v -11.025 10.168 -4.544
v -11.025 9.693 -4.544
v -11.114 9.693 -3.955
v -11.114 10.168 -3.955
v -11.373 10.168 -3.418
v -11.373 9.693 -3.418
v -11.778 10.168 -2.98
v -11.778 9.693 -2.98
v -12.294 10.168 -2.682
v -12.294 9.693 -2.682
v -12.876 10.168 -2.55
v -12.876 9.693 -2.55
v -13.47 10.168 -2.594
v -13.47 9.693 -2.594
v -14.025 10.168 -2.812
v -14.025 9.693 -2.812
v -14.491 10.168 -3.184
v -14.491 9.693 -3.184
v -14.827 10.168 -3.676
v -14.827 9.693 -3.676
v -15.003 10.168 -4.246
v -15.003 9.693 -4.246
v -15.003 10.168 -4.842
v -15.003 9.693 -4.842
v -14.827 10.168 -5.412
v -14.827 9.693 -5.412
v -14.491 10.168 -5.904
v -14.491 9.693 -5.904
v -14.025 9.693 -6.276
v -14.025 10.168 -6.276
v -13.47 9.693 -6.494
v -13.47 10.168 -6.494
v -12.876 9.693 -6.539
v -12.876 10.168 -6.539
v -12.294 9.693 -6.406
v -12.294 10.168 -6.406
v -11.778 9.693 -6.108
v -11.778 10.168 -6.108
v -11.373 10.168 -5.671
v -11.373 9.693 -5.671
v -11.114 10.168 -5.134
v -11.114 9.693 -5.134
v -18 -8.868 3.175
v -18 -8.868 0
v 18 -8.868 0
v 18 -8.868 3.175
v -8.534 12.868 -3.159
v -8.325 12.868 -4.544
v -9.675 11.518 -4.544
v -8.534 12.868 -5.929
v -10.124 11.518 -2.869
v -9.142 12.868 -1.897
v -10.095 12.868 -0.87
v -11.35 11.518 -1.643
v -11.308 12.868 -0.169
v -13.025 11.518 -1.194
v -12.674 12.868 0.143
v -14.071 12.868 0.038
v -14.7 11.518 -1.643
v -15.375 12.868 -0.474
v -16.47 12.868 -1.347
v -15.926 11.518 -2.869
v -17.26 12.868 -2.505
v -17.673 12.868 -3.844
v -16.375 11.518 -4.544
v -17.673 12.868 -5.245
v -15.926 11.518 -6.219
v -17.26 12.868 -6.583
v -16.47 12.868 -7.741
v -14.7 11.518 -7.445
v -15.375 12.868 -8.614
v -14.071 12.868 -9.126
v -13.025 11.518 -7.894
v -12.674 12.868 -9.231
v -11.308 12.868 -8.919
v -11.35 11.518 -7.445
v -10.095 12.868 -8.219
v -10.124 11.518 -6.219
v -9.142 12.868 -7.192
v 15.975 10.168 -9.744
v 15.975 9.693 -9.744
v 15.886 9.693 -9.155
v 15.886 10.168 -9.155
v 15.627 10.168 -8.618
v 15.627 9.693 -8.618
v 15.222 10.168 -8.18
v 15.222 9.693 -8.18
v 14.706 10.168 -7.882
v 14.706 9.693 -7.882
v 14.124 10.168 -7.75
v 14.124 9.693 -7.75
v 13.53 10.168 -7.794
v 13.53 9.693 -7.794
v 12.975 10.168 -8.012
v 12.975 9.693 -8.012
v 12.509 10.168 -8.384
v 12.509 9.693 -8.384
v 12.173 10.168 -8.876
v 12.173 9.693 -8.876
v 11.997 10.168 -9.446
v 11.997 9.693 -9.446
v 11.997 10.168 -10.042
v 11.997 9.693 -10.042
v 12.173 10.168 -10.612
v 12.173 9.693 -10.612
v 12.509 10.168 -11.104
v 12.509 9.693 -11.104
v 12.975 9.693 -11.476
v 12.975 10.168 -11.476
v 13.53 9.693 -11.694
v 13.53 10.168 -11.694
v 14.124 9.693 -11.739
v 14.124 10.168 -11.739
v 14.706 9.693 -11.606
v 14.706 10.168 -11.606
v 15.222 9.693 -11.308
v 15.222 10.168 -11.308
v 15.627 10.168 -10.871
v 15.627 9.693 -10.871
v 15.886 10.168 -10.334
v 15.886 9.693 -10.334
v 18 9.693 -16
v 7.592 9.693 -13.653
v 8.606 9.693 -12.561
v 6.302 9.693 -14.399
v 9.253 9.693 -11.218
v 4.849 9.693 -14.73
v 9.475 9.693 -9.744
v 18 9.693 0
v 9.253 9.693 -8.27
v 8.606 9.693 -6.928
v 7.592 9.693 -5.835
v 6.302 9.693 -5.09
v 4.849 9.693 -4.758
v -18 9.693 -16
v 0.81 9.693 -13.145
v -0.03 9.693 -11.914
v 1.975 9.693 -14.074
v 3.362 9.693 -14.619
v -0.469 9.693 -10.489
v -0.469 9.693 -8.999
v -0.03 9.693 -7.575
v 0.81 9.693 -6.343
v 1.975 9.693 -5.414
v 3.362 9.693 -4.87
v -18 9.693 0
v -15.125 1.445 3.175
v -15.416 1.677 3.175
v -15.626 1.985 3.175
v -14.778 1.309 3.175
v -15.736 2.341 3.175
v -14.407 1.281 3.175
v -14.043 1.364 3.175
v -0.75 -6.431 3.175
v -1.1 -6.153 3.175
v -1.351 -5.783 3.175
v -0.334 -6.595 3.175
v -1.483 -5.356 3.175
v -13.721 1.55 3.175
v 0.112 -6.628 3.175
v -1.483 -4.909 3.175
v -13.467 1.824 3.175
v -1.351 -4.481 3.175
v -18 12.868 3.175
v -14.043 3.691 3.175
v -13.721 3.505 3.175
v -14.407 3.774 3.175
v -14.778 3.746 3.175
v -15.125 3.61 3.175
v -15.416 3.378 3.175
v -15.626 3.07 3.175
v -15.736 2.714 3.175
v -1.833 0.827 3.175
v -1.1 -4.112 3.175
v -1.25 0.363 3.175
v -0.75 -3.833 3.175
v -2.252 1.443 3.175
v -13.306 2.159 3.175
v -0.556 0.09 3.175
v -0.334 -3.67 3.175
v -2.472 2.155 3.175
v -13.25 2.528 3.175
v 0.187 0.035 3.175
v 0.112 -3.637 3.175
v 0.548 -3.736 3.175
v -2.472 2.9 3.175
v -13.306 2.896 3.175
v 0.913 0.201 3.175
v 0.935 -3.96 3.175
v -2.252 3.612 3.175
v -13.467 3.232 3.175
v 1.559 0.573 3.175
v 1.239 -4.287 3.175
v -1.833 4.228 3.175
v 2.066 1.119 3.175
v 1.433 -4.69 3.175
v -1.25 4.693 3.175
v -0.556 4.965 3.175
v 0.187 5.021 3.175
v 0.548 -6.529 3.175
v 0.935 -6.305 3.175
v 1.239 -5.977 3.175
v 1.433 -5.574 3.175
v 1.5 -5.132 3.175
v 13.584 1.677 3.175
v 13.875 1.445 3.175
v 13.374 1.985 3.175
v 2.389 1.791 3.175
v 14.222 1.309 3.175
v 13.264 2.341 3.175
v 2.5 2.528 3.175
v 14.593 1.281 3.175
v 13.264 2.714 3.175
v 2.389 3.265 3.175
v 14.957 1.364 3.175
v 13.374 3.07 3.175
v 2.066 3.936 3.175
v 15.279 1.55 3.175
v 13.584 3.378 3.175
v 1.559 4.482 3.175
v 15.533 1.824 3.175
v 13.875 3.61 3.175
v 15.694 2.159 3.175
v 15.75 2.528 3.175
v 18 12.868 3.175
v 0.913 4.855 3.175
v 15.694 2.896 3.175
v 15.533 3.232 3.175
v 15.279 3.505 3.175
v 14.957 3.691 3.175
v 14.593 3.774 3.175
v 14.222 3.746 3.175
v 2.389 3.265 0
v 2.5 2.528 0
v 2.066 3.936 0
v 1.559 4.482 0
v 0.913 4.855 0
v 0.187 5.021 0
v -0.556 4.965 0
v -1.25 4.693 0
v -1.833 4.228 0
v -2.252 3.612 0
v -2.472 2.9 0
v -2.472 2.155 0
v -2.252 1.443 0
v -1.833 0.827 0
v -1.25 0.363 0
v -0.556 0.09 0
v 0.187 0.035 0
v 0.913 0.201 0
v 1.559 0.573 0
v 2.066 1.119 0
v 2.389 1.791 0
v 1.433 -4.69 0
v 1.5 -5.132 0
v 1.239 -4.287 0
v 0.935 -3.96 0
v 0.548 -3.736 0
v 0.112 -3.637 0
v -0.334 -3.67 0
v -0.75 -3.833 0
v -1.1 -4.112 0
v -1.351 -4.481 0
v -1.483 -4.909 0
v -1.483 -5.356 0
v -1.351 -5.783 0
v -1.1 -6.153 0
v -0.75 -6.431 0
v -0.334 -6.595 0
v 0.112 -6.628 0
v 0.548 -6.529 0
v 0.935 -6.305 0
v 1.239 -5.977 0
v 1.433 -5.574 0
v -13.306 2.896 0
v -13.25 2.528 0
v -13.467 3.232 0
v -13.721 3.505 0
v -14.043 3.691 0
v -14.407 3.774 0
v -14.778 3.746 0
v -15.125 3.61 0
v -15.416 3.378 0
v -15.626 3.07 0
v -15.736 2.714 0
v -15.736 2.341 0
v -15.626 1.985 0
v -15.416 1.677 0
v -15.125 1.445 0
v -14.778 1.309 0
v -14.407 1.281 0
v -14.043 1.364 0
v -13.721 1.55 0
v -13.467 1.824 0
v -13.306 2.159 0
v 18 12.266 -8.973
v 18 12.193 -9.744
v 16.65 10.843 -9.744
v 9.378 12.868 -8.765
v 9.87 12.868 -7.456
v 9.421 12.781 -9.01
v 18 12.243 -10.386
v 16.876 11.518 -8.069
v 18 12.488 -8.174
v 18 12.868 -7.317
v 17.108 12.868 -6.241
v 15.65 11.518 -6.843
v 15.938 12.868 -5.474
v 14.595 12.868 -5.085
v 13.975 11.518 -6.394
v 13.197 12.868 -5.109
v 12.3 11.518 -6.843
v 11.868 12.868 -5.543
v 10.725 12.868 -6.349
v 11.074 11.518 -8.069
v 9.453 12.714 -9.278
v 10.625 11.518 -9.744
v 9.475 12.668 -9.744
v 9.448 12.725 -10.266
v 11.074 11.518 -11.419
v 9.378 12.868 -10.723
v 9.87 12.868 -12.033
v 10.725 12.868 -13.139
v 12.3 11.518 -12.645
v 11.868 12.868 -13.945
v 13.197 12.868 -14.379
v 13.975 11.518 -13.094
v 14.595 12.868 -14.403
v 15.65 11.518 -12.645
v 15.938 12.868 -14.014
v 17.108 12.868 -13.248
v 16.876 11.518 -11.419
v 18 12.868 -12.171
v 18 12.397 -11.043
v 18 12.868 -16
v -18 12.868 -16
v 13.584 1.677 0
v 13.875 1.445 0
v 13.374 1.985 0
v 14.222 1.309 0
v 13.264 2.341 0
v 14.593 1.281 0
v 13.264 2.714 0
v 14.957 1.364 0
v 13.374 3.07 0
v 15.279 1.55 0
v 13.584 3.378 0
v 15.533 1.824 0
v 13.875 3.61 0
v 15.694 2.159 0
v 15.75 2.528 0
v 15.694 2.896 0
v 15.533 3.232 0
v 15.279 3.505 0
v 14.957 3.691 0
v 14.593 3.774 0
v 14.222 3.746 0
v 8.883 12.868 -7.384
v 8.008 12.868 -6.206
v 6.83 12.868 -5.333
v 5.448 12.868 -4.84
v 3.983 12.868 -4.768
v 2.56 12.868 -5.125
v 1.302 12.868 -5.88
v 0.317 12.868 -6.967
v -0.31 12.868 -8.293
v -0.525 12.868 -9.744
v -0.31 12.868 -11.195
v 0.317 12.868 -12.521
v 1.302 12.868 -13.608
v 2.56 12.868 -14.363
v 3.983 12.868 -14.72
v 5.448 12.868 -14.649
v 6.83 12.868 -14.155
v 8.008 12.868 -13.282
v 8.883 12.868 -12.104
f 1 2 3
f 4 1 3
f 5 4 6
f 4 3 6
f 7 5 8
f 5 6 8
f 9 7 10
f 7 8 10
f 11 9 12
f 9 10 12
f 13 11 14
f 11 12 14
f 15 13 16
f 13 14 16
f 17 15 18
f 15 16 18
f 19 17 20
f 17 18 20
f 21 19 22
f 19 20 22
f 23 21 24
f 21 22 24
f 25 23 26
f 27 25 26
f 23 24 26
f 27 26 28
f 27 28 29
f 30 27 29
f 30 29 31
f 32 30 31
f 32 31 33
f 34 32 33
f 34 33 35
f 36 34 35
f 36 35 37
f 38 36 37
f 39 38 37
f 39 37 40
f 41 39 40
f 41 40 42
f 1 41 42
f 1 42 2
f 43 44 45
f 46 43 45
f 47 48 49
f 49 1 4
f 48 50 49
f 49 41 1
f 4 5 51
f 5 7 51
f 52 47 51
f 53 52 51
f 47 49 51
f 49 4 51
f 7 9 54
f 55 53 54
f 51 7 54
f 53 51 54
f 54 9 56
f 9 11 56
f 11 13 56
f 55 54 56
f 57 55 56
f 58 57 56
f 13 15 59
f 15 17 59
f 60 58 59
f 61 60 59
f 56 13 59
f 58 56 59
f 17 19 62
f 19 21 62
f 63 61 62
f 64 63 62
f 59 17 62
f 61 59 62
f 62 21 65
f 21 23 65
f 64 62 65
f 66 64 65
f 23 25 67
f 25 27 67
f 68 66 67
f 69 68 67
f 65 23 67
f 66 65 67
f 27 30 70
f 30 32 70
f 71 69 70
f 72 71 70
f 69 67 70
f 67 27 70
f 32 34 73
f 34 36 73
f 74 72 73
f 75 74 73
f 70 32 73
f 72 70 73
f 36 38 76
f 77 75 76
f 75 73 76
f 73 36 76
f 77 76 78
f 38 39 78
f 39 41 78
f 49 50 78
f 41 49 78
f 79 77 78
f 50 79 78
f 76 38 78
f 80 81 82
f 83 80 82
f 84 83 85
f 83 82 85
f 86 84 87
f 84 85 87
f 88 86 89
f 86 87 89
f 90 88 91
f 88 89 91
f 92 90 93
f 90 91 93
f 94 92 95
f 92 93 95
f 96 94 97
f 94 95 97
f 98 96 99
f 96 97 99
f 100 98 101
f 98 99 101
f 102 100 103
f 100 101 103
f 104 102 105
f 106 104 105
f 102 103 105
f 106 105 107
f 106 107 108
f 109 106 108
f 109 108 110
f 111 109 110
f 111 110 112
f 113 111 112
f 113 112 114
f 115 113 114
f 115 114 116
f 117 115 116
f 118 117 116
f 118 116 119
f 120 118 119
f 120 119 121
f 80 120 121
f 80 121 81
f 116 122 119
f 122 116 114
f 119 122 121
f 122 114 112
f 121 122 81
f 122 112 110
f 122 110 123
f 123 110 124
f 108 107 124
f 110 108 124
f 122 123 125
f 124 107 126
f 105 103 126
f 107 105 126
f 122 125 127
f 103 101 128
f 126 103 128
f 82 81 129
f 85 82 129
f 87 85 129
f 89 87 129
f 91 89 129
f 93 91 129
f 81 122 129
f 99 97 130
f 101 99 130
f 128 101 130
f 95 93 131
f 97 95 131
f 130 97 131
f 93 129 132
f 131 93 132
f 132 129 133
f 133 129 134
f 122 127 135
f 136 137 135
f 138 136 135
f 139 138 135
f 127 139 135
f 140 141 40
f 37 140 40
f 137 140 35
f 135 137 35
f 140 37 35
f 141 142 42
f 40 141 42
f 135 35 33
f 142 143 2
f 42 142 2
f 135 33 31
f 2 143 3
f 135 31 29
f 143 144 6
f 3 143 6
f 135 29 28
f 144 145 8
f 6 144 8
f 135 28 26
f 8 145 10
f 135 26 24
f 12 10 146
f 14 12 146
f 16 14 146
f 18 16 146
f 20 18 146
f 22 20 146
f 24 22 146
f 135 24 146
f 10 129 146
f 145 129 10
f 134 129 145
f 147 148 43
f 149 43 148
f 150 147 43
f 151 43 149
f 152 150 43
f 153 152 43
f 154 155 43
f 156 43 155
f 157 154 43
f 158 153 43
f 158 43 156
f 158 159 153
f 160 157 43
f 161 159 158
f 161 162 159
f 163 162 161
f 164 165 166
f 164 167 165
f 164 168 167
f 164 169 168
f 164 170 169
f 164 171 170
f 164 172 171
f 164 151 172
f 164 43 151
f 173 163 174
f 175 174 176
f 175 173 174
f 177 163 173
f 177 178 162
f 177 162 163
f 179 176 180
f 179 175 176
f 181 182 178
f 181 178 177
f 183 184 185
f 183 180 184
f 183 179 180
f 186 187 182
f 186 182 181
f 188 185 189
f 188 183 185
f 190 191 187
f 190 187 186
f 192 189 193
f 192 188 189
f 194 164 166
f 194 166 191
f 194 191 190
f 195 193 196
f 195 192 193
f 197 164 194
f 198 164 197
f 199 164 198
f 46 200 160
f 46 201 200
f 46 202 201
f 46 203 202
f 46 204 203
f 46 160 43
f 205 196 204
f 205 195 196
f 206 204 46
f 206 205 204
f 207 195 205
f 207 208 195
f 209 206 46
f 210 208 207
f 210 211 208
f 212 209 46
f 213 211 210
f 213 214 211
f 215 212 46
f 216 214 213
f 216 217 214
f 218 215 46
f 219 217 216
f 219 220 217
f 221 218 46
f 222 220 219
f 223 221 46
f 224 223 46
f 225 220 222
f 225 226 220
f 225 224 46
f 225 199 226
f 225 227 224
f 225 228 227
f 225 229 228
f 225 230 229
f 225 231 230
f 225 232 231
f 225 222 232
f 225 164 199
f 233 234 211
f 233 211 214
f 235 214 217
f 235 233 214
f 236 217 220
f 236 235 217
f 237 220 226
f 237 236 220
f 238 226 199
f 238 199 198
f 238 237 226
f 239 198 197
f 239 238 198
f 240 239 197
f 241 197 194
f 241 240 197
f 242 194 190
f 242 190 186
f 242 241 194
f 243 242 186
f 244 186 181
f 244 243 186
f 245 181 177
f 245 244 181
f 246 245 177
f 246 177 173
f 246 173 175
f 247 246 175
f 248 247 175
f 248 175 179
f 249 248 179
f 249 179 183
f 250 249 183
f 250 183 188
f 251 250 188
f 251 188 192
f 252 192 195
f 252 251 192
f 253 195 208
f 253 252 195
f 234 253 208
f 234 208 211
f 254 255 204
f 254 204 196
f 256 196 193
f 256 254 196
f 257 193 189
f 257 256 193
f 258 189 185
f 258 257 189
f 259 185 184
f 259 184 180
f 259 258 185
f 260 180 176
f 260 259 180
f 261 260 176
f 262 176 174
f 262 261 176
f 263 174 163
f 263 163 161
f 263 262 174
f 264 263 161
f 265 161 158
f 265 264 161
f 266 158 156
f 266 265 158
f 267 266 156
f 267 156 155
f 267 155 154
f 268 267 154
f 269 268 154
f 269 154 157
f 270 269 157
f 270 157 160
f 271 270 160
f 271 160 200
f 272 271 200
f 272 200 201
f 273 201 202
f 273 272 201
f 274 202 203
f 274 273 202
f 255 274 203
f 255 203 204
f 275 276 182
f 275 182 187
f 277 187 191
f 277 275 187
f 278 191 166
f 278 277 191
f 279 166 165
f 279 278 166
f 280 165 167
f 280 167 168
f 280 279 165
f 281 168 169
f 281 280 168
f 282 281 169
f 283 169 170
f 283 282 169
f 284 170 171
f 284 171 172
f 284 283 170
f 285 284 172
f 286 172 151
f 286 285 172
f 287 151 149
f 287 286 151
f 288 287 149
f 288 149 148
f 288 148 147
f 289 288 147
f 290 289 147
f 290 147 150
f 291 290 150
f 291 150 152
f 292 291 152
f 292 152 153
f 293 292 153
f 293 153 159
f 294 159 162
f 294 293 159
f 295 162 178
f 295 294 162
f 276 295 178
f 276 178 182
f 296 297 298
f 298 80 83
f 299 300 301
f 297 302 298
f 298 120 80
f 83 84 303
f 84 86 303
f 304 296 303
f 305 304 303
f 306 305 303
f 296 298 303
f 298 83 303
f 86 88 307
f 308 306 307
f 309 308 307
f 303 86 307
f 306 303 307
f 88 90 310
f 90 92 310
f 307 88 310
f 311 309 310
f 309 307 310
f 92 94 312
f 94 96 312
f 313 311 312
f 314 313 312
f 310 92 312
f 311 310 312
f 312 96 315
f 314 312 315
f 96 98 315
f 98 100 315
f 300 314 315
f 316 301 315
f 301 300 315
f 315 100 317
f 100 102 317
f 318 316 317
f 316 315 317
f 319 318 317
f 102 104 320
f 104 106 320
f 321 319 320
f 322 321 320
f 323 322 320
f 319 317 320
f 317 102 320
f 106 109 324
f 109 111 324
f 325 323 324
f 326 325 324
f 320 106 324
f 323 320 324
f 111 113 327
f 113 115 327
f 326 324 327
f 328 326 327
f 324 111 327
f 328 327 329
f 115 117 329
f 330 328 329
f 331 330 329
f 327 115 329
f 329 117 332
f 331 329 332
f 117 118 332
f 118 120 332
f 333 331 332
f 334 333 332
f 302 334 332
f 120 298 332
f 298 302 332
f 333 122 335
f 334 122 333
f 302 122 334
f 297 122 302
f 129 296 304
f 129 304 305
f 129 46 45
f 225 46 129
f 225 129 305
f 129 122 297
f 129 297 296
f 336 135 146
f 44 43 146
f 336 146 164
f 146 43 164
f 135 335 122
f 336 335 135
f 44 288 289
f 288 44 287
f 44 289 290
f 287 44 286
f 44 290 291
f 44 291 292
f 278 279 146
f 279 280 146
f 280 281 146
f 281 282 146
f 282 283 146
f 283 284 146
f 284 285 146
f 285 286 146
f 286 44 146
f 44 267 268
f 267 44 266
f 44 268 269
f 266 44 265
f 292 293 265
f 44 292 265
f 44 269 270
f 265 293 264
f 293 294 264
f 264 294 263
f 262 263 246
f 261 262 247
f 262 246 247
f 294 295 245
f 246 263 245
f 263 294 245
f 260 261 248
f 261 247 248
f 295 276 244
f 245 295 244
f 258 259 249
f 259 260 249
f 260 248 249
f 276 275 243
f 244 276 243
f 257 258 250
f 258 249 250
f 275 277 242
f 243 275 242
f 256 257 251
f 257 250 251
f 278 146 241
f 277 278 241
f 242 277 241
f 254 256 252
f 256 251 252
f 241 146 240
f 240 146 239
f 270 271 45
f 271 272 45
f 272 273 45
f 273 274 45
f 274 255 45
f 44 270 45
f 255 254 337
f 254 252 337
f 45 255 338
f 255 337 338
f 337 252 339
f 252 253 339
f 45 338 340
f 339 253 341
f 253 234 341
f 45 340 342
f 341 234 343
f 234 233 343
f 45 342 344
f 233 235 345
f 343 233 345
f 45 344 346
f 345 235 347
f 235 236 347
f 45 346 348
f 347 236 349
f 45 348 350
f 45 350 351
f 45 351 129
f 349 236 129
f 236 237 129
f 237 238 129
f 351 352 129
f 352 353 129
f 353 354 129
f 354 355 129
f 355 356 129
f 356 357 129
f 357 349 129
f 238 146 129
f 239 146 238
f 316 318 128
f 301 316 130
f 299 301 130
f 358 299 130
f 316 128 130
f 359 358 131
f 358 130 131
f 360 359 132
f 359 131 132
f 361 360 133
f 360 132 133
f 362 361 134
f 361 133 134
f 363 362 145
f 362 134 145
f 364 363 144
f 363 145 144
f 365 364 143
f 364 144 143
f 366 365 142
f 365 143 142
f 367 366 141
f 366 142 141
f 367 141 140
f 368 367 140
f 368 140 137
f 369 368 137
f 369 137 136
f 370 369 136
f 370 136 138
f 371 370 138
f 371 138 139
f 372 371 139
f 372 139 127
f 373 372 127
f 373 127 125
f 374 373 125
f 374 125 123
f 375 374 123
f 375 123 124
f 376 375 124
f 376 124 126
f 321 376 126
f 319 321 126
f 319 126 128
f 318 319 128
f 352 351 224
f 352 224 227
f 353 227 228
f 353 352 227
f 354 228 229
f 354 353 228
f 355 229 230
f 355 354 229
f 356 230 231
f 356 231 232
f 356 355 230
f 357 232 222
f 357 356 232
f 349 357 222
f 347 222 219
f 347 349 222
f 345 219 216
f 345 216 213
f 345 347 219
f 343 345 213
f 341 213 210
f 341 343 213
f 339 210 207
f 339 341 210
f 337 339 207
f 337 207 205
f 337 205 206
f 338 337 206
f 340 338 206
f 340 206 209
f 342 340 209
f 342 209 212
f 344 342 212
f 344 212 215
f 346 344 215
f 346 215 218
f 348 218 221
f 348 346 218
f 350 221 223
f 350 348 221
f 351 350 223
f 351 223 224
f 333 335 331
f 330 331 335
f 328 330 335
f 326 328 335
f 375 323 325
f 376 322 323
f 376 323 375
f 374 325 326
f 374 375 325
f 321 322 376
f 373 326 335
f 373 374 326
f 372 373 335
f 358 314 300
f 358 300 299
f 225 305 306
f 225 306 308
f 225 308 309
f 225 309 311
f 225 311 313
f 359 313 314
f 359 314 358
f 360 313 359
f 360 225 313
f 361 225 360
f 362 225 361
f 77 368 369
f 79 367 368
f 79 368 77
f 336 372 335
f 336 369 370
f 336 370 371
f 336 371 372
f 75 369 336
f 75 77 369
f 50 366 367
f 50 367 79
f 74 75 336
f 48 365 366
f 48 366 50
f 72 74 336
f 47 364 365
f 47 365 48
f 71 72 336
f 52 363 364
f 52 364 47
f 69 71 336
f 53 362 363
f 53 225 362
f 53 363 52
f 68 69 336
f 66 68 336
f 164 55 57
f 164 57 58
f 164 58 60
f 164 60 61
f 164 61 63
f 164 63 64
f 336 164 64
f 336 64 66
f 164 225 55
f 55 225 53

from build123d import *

# Parameters (mm, degrees)
SKETCH1_W                                            = 36
SKETCH1_H                                            = 21.735371596
SKETCH1_R                                            = 1.25
SKETCH1_R_2                                          = 2.5
SKETCH1_R_3                                          = 1.5
BOSS_EXTRUDE1_DEPTH                                  = 3.175
SKETCH2_W                                            = 36
SKETCH2_H                                            = 3.175
BOSS_EXTRUDE2_DEPTH                                  = 16
SKETCH3_R                                            = 5
SKETCH3_R_2                                          = 2
CUT_EXTRUDE1_DEPTH                                   = 10
ESCAREADO_PARA_PARAFUSO_DE_M_QUINA_COM_C_D           = 4
ESCAREADO_PARA_PARAFUSO_DE_M_QUINA_COM_C_CSINK_D     = 9.4
ESCAREADO_PARA_PARAFUSO_DE_M_QUINA_COM_C_CSINK_ANGLE = 90


with BuildPart() as part:
    # Sketch1 → Boss-Extrude1 (new body)
    with BuildSketch(Plane.XY):
        with Locations((0, 2)):
            Rectangle(SKETCH1_W, SKETCH1_H)
        with Locations((-14.5, 2.527685798)):
            Circle(SKETCH1_R, mode=Mode.SUBTRACT)
        with Locations((14.5, 2.527685798)):
            Circle(SKETCH1_R, mode=Mode.SUBTRACT)
        with Locations((0, 2.527685798)):
            Circle(SKETCH1_R_2, mode=Mode.SUBTRACT)
        with Locations((0, -5.132314202)):
            Circle(SKETCH1_R_3, mode=Mode.SUBTRACT)
    extrude(amount=BOSS_EXTRUDE1_DEPTH)

    # Sketch2 → Boss-Extrude2 (add)
    with BuildSketch(Plane(origin=(0, 0, 0), x_dir=(-1, 0, 0), z_dir=(0, 0, -1))):
        with Locations((0, 11.280185798)):
            Rectangle(SKETCH2_W, SKETCH2_H)
    extrude(amount=BOSS_EXTRUDE2_DEPTH)

    # Sketch3 → Cut-Extrude1 (cut)
    with BuildSketch(Plane.XZ.offset(-9.692685798)):
        with Locations((4.475, -9.744145571)):
            Circle(SKETCH3_R)
        with Locations((-13.025, -4.544145571)):
            Circle(SKETCH3_R_2)
        with Locations((13.975, -9.744145571)):
            Circle(SKETCH3_R_2)
    extrude(amount=-CUT_EXTRUDE1_DEPTH, mode=Mode.SUBTRACT)

    # Escareado para parafuso de máquina com cabeça chata de M42 (through all)
    with Locations(Plane(origin=(0, 12.867685798, 0), x_dir=(-1, 0, 0), z_dir=(0, 1, 0))):
        with Locations((13.025, -4.544145571), (-13.975, -9.744145571)):
            CounterSinkHole(ESCAREADO_PARA_PARAFUSO_DE_M_QUINA_COM_C_D / 2, ESCAREADO_PARA_PARAFUSO_DE_M_QUINA_COM_C_CSINK_D / 2, counter_sink_angle=ESCAREADO_PARA_PARAFUSO_DE_M_QUINA_COM_C_CSINK_ANGLE)


solid = part.part
